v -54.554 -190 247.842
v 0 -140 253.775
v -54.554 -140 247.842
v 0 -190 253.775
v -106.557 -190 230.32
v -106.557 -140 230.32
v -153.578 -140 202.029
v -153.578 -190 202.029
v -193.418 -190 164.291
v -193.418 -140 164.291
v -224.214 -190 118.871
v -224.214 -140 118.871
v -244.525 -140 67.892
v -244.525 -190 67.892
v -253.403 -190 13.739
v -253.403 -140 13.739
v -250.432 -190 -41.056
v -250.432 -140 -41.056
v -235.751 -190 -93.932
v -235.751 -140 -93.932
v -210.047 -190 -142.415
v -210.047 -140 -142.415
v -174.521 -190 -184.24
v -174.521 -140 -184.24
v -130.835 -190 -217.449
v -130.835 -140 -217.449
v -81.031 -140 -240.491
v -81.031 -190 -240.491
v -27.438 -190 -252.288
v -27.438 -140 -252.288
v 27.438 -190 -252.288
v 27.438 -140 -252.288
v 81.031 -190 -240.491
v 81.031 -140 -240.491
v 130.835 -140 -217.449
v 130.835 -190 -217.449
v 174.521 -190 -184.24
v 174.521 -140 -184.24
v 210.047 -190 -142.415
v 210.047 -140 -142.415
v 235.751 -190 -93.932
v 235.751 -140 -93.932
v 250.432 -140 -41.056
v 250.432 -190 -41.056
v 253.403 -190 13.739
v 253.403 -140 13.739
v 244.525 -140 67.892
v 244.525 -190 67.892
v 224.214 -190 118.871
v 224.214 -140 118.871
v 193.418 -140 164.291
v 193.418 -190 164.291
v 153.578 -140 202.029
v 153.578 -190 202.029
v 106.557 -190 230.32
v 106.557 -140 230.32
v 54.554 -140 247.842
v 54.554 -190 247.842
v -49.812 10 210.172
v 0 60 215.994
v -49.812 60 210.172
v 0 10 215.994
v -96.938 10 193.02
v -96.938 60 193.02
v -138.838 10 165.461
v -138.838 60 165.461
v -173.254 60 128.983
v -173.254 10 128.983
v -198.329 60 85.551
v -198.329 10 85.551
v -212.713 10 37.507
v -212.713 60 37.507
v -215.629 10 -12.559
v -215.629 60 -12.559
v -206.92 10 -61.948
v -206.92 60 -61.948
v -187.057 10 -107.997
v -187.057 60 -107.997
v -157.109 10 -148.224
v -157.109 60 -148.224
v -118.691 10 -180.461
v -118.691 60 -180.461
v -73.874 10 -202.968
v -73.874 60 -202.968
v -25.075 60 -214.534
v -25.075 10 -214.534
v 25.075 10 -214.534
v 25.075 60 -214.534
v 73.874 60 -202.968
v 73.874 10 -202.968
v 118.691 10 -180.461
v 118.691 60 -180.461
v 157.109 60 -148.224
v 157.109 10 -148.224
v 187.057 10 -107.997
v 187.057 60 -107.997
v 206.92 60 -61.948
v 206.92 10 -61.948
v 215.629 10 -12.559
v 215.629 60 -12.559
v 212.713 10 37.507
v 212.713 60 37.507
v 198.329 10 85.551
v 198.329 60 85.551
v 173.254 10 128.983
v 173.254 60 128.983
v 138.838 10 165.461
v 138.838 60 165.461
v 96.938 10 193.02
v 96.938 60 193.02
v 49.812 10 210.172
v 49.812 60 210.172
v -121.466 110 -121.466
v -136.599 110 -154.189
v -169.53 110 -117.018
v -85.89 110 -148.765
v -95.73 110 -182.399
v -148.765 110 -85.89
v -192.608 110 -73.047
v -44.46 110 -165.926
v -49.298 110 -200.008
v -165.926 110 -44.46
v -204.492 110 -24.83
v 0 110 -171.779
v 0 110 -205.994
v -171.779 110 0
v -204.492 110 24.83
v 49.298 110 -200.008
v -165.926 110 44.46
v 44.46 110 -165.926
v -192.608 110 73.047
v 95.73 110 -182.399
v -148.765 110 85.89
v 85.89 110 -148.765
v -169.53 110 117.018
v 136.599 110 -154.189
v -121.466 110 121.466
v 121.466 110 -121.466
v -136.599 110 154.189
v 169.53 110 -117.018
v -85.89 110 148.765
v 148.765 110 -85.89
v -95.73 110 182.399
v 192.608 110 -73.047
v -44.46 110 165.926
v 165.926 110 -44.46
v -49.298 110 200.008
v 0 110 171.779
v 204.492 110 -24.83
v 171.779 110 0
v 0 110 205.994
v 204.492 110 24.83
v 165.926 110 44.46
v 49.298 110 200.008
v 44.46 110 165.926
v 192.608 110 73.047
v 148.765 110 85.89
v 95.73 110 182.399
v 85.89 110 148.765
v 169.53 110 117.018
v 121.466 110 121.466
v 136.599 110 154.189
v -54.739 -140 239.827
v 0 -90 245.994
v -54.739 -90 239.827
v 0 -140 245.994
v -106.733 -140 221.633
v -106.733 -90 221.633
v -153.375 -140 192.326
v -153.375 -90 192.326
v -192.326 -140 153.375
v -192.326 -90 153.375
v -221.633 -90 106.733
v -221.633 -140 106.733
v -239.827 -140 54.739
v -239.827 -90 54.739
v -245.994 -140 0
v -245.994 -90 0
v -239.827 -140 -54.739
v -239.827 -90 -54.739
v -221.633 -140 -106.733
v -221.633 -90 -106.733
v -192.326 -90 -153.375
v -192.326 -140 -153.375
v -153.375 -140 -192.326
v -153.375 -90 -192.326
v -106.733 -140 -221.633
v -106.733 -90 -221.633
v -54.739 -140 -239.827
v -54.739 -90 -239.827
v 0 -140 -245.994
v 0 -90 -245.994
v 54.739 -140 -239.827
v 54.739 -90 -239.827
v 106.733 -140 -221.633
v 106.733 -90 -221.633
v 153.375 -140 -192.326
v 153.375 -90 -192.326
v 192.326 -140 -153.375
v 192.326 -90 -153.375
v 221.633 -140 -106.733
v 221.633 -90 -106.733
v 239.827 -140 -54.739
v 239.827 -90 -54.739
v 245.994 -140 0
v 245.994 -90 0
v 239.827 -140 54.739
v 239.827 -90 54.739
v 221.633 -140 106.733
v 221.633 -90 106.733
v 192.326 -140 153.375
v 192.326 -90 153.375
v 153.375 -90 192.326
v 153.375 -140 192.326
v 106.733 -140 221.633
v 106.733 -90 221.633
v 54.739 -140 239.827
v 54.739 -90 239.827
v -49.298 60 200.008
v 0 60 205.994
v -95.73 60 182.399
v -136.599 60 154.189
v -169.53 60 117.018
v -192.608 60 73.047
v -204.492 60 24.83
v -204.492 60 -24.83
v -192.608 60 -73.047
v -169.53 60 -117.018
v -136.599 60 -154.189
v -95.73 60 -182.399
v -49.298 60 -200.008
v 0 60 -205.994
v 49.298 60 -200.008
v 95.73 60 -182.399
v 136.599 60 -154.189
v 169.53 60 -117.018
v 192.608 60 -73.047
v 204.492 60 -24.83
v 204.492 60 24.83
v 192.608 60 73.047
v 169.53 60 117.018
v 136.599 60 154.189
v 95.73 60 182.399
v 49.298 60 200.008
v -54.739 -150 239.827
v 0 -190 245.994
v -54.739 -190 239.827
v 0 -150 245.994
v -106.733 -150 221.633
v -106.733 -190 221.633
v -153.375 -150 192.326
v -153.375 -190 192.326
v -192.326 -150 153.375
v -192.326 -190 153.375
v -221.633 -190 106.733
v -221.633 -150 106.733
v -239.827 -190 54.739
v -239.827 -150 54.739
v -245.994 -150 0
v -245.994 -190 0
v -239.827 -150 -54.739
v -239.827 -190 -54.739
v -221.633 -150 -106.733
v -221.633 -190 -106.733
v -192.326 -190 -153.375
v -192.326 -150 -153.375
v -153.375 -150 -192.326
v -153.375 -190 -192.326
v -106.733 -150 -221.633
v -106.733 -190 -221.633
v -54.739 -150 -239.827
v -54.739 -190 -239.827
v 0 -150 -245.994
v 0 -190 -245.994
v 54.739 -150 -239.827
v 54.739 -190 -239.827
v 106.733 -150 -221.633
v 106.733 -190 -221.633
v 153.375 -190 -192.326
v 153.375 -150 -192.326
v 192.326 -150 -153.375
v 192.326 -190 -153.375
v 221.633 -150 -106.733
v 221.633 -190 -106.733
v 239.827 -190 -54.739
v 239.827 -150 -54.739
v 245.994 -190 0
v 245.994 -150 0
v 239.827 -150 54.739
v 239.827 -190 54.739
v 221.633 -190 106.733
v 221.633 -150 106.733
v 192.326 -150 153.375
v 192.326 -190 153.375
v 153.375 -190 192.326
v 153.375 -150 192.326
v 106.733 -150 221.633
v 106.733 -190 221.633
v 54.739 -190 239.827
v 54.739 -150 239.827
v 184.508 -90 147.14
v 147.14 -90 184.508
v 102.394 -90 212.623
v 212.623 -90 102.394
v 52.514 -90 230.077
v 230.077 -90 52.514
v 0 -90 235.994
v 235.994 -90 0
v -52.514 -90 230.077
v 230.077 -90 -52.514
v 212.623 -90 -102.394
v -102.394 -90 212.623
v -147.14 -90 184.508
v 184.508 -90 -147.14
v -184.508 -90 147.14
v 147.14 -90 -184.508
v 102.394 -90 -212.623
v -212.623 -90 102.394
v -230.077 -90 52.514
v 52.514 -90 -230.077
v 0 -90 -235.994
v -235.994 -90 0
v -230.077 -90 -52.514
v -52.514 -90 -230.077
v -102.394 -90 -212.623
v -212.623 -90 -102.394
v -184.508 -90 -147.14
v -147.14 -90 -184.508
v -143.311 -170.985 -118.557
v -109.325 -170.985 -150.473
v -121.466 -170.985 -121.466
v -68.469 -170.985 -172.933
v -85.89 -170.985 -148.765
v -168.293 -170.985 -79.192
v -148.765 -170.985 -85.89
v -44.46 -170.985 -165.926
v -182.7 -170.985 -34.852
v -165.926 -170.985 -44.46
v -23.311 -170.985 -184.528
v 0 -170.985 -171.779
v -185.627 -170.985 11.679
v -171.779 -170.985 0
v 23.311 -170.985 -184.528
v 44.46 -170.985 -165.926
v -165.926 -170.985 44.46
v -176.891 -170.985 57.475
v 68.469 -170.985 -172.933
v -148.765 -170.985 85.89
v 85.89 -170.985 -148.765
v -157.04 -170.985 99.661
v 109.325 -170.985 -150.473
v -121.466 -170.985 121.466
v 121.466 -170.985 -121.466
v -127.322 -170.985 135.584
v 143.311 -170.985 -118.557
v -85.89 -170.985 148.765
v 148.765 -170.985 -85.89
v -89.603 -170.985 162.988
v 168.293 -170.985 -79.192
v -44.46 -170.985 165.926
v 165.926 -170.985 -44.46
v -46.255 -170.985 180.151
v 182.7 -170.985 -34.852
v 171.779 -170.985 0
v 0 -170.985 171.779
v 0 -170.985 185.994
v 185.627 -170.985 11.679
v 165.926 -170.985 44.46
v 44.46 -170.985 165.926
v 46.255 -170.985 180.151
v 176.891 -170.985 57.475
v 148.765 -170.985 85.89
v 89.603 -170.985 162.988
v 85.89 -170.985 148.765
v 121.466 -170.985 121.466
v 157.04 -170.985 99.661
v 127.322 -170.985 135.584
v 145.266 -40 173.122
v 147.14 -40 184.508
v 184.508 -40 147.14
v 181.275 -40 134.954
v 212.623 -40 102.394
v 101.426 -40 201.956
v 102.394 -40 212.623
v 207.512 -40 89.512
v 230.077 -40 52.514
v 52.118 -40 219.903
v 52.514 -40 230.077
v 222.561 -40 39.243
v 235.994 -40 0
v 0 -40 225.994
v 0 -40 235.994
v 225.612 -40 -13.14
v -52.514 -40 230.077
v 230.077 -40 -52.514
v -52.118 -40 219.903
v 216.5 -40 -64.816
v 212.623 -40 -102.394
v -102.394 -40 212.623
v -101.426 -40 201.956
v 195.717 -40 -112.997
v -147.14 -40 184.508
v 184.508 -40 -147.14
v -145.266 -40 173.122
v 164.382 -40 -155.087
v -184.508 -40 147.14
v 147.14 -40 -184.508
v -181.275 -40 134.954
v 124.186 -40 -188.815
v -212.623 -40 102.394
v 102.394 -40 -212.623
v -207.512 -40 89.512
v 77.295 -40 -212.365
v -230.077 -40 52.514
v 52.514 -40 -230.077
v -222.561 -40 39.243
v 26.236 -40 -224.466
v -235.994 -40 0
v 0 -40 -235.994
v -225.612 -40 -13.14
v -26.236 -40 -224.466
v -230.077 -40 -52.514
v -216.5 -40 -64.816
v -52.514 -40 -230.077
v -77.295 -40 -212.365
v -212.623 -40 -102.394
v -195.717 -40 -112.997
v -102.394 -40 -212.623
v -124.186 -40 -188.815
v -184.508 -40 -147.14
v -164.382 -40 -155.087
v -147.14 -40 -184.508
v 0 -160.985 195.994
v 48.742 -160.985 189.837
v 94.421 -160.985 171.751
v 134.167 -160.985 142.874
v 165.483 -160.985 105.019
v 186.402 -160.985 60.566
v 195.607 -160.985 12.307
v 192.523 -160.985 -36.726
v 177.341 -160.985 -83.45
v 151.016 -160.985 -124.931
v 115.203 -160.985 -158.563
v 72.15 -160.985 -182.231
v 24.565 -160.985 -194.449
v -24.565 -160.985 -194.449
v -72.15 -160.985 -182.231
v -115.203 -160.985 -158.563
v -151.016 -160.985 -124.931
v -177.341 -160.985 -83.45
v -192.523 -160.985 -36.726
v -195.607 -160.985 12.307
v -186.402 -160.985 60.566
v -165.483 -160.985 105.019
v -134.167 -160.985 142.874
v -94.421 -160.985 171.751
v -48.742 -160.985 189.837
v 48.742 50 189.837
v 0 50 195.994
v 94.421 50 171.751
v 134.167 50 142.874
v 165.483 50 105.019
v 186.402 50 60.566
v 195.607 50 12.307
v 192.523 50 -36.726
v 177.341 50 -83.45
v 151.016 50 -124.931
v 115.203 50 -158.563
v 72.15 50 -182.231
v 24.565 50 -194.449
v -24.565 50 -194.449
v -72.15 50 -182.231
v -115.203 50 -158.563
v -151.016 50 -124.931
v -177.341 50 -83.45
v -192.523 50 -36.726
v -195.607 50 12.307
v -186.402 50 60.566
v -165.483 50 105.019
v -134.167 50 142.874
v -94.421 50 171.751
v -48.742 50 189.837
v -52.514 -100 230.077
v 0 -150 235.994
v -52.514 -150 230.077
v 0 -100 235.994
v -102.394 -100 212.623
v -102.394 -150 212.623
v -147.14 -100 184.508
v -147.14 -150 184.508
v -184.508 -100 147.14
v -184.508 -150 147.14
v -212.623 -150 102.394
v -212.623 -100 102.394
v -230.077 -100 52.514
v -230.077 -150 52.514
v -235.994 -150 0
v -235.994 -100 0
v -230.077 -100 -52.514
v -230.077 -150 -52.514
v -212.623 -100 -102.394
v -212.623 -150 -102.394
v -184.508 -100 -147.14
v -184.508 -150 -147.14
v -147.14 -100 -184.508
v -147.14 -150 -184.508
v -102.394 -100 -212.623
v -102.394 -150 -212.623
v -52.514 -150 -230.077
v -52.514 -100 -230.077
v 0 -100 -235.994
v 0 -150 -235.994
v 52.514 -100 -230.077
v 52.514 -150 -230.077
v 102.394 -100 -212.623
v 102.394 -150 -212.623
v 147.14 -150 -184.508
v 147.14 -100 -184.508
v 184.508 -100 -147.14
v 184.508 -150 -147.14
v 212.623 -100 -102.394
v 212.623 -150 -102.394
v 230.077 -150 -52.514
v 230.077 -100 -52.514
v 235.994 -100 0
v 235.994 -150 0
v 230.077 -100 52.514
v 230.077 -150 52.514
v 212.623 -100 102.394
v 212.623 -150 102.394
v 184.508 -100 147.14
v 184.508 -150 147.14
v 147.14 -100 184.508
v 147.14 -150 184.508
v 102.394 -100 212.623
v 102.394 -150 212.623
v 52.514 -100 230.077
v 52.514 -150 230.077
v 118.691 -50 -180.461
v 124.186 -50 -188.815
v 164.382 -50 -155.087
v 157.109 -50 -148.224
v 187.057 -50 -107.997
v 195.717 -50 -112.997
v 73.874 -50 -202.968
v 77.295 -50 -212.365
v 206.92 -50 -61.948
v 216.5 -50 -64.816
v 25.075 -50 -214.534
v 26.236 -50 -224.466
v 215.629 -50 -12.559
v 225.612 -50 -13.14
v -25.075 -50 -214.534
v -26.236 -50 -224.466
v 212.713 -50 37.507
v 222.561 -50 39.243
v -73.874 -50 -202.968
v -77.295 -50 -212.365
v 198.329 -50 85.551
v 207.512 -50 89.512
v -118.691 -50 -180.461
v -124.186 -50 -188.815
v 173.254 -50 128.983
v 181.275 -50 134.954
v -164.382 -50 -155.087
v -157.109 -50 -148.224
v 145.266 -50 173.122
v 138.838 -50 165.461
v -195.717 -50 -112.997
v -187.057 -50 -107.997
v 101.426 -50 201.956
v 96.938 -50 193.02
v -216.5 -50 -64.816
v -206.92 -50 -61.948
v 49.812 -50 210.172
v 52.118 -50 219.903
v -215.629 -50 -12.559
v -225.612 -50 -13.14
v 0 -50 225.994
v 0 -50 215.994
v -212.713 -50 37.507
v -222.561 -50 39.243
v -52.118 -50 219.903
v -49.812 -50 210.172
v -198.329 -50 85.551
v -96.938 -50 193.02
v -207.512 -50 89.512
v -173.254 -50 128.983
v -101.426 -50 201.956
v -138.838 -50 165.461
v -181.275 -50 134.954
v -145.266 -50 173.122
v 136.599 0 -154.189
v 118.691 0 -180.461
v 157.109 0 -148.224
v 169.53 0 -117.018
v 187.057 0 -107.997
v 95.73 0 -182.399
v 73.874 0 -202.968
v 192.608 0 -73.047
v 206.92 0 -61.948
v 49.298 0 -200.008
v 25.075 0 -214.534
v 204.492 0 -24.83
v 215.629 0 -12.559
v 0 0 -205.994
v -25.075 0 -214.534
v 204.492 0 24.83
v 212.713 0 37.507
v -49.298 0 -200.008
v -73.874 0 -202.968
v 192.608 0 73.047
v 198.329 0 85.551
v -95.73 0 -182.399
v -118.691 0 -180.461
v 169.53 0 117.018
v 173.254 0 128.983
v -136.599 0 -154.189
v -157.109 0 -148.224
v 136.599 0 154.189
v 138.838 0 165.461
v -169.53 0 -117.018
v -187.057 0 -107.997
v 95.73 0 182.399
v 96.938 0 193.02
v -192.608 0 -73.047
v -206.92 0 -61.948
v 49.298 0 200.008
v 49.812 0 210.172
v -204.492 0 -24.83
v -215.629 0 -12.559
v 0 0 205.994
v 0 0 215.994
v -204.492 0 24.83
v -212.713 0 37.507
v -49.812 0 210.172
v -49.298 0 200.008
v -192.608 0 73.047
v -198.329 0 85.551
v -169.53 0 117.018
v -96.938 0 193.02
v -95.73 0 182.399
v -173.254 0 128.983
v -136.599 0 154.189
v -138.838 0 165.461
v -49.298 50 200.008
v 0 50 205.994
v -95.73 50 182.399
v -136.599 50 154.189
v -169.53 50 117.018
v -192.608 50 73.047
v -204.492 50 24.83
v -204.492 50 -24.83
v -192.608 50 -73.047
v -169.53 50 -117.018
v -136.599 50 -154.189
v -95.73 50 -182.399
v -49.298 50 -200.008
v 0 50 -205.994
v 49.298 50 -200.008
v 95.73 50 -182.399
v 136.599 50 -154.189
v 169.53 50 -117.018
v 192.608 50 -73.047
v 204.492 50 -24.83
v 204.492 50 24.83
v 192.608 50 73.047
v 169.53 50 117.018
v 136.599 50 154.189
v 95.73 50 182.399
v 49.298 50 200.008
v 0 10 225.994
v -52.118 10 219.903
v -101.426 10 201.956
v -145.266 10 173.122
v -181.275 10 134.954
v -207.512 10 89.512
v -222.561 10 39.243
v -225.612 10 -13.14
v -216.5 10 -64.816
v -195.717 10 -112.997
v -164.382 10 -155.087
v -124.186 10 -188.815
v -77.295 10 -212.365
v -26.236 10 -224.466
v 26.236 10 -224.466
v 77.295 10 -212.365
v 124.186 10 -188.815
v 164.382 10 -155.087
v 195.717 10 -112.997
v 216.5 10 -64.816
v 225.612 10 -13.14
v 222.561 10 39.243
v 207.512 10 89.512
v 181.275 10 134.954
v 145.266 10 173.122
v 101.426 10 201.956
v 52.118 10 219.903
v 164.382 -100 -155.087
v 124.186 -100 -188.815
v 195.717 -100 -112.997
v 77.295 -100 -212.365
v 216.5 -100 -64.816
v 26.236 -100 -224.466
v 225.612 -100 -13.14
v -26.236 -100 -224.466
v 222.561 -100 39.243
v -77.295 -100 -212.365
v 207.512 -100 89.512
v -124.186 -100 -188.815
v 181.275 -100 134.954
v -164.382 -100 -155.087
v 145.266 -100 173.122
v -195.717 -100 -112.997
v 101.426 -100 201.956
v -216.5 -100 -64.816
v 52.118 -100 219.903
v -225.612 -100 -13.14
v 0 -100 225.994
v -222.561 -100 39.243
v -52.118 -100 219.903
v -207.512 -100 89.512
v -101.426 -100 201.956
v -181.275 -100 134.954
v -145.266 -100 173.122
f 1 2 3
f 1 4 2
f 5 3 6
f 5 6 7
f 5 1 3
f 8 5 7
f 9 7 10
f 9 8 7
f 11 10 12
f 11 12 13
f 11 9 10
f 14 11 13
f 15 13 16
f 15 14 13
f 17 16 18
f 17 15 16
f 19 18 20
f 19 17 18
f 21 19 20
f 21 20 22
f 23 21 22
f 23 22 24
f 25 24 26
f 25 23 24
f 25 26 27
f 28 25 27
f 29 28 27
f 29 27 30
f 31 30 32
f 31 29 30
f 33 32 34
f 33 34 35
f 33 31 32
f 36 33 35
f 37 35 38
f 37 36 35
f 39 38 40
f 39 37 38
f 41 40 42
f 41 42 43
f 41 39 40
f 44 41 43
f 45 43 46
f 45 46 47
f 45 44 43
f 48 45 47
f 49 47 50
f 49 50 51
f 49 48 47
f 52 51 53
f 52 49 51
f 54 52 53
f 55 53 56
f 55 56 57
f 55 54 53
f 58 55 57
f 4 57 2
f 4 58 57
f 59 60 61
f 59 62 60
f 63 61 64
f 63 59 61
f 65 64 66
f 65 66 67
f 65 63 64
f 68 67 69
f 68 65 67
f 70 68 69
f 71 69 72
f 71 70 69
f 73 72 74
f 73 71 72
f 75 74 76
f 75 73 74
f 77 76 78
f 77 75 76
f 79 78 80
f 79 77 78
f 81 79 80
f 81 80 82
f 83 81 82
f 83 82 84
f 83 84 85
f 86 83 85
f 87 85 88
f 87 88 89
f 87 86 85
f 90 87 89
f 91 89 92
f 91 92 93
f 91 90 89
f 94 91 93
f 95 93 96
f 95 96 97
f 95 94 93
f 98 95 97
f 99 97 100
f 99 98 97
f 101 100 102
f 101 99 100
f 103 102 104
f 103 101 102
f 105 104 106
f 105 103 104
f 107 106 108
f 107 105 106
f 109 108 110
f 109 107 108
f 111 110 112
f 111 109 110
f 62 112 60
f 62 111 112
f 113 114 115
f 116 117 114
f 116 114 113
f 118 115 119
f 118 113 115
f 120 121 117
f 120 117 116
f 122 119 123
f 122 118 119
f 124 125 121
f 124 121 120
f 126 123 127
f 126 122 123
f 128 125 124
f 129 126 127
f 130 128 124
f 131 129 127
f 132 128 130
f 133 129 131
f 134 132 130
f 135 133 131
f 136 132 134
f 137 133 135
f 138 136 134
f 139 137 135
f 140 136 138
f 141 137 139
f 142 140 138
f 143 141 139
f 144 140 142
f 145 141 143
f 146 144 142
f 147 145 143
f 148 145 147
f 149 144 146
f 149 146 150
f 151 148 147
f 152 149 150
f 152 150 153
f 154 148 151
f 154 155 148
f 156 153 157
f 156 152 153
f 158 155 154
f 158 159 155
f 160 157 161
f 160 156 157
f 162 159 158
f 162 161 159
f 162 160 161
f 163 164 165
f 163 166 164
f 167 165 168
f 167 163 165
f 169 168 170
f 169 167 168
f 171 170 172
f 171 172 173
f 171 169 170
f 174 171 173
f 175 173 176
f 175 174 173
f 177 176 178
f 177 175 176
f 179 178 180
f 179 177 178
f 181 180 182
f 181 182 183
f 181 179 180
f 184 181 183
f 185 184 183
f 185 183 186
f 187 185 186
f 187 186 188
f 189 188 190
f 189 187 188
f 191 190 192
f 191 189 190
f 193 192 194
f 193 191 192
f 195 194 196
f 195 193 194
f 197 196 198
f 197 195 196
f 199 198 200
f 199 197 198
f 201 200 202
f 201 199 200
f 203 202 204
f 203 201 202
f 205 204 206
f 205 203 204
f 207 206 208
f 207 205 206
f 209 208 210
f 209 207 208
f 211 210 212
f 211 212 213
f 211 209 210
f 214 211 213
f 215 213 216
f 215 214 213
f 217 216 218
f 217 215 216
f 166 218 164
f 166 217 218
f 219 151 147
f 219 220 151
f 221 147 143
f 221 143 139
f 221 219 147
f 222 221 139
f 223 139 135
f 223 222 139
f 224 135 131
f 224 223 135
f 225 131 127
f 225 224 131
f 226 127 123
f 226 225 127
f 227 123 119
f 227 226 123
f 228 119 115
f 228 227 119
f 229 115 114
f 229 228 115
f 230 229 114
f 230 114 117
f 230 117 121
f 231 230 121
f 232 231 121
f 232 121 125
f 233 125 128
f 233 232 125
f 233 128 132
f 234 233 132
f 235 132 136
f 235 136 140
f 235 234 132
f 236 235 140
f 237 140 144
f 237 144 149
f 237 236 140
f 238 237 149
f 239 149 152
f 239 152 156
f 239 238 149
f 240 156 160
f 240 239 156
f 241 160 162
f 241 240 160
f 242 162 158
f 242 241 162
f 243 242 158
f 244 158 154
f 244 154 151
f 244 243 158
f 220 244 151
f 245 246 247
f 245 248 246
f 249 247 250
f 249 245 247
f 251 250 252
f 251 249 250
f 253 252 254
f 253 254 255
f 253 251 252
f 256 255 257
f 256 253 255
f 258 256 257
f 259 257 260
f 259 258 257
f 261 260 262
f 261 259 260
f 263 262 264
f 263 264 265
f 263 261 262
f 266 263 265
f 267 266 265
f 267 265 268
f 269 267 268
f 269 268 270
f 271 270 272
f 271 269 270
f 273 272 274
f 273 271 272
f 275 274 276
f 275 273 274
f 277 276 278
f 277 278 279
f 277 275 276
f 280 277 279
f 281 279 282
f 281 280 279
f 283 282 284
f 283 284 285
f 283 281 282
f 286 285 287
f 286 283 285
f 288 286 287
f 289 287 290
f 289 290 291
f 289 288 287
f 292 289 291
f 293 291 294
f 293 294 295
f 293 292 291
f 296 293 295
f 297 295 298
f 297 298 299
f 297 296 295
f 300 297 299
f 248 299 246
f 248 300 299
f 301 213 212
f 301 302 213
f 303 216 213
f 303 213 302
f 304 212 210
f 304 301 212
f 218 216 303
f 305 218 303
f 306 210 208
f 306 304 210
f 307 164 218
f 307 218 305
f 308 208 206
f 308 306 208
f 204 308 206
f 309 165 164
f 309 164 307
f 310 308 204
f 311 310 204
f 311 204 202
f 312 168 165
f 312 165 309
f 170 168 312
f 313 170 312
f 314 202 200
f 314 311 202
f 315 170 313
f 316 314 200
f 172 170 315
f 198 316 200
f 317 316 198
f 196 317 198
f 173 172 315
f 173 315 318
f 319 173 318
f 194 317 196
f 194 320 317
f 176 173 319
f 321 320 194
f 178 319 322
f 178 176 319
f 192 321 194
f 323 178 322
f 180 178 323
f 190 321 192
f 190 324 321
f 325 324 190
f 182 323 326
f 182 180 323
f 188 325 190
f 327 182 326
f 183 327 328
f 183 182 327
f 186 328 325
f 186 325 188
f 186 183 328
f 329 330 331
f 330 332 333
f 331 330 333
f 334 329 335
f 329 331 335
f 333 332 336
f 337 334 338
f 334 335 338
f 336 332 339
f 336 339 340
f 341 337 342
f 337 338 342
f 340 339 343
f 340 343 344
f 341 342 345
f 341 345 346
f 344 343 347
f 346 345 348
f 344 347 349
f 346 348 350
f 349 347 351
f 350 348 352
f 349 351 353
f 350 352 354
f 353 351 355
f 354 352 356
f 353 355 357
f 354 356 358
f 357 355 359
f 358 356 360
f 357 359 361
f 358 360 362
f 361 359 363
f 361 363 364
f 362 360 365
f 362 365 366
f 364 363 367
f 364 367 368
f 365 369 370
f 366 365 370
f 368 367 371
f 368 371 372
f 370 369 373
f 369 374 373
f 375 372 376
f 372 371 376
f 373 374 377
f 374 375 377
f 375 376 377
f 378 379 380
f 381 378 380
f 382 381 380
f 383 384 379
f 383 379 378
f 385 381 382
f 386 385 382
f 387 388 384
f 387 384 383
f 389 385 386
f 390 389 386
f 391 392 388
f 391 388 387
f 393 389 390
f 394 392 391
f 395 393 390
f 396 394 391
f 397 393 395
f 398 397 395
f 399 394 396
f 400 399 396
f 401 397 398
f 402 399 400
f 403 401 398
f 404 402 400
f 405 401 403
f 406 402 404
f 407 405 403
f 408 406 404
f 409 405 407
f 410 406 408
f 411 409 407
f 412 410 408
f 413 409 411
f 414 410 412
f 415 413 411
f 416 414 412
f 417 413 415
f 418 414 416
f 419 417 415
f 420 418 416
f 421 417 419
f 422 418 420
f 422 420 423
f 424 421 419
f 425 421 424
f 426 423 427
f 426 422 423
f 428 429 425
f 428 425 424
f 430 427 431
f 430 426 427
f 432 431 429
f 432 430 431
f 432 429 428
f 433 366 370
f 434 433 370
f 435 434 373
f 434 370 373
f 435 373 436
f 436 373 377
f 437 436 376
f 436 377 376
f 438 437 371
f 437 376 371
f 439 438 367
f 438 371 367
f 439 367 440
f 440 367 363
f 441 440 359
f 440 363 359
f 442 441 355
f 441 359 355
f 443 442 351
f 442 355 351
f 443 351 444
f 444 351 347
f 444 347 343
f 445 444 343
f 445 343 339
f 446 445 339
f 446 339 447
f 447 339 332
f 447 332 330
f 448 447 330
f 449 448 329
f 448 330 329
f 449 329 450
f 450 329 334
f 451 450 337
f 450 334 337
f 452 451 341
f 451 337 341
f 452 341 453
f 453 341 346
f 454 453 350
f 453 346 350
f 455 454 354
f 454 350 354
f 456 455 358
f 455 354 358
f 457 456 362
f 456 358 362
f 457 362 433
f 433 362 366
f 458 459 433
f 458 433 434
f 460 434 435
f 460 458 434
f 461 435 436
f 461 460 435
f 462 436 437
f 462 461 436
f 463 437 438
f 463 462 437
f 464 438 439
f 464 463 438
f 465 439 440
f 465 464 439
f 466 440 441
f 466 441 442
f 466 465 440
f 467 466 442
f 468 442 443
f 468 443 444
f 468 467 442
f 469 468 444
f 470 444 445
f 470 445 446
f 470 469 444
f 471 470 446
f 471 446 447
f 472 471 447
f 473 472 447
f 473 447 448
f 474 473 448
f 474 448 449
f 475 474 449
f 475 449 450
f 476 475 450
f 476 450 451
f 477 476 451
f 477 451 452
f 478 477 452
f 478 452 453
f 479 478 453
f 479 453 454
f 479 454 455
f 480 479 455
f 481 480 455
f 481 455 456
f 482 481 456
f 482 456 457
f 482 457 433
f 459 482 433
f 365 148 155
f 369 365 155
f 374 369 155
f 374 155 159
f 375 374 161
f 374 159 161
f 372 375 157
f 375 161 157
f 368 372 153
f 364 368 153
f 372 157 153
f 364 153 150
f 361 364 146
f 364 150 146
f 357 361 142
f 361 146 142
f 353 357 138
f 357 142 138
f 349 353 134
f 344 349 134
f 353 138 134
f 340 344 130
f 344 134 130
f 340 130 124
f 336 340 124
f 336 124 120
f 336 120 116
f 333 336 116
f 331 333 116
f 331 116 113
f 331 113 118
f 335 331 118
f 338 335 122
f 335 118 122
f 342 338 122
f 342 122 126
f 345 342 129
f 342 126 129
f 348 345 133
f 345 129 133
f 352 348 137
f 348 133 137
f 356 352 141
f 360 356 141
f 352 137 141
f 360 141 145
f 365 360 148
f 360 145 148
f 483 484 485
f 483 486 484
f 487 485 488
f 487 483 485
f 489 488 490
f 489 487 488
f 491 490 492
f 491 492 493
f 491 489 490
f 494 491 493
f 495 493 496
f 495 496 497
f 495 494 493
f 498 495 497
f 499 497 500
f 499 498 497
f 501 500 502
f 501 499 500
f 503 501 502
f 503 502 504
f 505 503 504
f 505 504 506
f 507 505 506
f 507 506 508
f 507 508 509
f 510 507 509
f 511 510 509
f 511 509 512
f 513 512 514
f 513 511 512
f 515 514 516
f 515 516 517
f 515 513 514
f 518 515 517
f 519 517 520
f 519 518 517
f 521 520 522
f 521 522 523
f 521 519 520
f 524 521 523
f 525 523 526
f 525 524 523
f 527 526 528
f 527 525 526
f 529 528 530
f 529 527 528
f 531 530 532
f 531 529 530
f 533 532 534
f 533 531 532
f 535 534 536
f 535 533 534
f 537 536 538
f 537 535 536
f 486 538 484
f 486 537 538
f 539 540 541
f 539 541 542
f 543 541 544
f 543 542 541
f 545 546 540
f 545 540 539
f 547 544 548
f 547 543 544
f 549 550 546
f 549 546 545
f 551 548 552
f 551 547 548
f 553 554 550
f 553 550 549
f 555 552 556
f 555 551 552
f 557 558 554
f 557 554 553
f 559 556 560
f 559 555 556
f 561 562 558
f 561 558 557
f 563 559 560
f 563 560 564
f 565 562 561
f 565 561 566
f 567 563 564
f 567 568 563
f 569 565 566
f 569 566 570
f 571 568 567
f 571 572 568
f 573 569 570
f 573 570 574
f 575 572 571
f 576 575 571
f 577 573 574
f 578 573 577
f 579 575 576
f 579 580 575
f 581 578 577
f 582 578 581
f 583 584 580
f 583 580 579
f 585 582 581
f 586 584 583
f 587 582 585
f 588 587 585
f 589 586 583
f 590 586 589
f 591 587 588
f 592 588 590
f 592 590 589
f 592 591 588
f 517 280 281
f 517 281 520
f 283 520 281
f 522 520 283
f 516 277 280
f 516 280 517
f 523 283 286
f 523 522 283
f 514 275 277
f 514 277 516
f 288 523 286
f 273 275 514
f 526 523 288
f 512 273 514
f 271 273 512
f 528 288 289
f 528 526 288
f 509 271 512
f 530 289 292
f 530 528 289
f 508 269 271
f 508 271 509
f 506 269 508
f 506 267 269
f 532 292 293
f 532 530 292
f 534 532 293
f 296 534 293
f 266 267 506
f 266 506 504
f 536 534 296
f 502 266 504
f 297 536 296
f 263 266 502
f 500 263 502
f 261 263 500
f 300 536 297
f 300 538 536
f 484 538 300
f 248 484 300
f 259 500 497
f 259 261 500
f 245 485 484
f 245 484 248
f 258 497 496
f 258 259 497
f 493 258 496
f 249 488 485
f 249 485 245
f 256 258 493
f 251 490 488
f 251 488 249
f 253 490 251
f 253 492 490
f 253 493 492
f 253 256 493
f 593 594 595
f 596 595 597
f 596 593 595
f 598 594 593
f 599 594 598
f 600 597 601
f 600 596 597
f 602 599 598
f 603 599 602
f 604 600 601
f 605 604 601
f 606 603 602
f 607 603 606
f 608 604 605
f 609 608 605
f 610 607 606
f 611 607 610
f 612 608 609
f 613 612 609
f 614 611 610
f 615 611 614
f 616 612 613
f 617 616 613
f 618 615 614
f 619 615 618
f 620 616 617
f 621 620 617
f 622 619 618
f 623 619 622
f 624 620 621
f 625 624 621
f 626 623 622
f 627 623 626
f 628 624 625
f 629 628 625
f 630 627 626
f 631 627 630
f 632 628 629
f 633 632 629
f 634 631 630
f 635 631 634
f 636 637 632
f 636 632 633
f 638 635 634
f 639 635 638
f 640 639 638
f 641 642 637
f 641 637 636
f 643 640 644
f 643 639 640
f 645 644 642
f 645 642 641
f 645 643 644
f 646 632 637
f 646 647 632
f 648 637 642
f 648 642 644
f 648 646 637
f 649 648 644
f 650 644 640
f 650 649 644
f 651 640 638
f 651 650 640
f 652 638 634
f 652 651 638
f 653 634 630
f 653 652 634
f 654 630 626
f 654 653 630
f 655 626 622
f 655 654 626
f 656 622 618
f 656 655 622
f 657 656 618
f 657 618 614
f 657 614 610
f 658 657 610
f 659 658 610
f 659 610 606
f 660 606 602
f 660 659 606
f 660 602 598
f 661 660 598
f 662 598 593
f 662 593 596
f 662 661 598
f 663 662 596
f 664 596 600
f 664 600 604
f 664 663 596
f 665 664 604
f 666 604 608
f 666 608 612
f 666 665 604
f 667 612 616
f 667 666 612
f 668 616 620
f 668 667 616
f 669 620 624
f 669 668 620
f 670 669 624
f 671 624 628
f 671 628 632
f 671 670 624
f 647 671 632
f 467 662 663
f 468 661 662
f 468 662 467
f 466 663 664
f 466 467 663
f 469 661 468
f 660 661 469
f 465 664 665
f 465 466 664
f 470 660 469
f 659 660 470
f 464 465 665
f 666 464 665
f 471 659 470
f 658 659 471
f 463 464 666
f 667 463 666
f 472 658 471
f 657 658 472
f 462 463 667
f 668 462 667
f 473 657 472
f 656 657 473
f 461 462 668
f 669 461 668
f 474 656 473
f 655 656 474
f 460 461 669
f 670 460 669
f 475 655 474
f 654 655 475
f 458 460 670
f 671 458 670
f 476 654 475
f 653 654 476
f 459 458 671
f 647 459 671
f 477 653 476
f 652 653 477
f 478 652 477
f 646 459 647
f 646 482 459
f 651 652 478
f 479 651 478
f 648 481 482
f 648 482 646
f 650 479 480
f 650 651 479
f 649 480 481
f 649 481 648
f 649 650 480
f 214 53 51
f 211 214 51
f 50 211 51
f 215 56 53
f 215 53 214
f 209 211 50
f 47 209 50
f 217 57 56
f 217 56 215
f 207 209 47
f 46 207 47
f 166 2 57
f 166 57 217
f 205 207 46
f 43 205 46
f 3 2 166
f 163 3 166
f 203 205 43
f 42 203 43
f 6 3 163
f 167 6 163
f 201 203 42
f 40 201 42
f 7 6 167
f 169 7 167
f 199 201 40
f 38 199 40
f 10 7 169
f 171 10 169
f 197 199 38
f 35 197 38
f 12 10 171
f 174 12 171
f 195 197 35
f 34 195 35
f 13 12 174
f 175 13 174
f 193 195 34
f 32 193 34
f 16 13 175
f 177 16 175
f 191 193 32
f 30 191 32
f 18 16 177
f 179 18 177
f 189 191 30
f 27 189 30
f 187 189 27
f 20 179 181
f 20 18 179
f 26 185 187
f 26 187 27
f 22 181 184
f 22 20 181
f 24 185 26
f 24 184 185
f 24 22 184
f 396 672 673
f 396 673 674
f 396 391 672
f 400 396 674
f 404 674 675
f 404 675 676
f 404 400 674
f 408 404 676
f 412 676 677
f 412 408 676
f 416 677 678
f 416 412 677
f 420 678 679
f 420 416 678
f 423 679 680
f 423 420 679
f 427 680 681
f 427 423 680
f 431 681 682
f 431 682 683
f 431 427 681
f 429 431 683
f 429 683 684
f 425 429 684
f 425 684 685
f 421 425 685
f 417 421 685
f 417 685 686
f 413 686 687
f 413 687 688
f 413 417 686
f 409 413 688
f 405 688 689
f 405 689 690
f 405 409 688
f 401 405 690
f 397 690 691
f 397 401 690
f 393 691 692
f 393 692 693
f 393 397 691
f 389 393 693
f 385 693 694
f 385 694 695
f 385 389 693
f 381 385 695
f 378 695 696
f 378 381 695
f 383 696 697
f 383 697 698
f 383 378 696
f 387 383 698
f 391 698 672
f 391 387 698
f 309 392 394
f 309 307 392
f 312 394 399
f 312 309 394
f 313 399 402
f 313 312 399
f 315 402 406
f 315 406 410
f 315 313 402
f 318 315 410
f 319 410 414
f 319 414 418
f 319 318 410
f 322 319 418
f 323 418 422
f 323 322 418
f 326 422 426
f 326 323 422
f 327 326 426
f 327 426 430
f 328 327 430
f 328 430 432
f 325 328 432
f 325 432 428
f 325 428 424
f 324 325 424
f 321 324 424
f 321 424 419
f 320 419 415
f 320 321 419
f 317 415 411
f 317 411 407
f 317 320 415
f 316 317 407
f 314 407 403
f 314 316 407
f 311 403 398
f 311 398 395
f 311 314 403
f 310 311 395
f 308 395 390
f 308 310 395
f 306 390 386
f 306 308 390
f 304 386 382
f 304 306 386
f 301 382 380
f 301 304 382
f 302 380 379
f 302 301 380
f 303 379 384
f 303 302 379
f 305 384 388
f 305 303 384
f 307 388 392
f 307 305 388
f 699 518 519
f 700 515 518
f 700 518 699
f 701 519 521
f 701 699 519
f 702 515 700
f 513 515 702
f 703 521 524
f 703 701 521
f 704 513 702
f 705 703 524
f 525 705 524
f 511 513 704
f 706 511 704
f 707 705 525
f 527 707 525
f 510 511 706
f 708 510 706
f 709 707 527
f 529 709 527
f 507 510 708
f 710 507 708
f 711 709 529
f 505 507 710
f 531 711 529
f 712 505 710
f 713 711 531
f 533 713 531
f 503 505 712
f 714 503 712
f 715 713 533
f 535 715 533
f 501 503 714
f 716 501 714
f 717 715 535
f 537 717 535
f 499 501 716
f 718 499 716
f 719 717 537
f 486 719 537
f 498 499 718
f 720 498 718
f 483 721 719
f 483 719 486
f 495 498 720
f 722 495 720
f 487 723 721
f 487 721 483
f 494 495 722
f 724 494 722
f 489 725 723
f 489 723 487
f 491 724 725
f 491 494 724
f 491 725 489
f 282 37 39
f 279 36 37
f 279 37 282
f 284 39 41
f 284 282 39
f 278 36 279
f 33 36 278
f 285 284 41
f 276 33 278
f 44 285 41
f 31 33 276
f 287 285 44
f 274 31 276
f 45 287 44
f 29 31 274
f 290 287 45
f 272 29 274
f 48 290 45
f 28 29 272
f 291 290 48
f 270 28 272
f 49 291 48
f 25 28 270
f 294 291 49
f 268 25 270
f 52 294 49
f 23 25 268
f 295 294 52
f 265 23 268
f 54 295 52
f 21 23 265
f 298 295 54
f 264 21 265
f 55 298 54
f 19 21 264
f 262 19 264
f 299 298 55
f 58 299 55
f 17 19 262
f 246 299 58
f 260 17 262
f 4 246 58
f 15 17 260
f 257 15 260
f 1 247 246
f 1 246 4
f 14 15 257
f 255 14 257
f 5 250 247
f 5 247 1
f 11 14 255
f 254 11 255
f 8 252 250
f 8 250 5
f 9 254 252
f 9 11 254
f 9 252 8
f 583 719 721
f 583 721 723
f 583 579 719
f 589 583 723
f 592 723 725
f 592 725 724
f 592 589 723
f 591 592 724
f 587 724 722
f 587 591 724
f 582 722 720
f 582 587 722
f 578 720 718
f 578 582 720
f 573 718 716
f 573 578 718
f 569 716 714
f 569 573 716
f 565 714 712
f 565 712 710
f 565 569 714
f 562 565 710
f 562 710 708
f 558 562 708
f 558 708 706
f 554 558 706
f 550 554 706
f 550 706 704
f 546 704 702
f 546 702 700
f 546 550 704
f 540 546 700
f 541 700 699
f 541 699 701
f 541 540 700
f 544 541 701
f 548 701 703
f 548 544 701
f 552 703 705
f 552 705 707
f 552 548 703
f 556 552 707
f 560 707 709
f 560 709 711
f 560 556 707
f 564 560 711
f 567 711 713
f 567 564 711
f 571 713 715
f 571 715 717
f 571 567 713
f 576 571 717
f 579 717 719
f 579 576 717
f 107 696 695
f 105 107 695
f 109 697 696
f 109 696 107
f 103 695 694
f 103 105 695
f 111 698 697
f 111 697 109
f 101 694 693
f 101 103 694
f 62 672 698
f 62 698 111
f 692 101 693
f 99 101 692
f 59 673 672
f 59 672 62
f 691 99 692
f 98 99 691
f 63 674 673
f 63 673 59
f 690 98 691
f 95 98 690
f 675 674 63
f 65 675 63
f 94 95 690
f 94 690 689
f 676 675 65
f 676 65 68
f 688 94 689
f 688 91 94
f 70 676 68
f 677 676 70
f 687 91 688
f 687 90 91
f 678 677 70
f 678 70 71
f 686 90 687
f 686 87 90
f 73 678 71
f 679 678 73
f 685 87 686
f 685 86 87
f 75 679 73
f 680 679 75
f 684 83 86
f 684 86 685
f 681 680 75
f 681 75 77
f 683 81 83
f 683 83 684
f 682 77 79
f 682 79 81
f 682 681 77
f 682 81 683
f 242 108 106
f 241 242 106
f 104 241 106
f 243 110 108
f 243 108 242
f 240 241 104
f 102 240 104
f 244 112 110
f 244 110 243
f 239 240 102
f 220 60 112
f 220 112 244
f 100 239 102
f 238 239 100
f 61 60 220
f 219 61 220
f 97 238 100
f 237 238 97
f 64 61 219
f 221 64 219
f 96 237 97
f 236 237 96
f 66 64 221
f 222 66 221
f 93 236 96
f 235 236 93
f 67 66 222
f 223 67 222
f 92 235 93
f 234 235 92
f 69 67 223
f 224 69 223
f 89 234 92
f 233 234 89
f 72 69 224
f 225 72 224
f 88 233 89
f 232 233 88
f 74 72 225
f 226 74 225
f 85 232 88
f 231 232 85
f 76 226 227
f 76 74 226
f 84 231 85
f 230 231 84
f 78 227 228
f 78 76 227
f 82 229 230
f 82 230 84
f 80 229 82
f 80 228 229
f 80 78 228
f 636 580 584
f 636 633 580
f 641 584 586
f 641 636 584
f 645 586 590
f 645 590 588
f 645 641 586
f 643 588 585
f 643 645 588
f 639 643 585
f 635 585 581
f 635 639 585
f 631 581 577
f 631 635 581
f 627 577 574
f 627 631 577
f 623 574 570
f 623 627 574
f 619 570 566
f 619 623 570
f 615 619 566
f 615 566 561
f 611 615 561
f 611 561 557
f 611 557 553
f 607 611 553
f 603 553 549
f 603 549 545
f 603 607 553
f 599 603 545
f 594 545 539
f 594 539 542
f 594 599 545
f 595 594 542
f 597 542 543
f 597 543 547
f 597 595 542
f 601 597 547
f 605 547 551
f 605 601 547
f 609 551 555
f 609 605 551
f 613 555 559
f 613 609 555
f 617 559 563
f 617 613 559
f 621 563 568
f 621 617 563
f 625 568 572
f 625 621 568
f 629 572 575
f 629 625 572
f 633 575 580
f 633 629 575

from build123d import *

# Parameters (mm, degrees)
SKETCH9_R           = 195.99424204
SKETCH9_R_2         = 171.779053358
BOSS_EXTRUDE1_DEPTH = 280.985470498
CHAMFER1_SIZE       = 10


with BuildPart() as part:
    # Sketch4 → Revolve3 (revolve)
    with BuildSketch(Plane.XY, mode=Mode.PRIVATE) as revolve3_sk:
        Polygon((-253.775337615, -190), (-245.99424204, -190), (-245.99424204, -150), (-235.99424204, -150), (-235.99424204, -100), (-225.99424204, -100), (-225.99424204, -50), (-215.99424204, -50), (-215.99424204, 0), (-205.99424204, 0), (-205.99424204, 50), (-195.99424204, 50), (-195.99424204, 110), (-205.99424204, 110), (-205.99424204, 60), (-215.99424204, 60), (-215.99424204, 10), (-225.99424204, 10), (-225.99424204, -40), (-235.99424204, -40), (-235.99424204, -90), (-245.99424204, -90), (-245.99424204, -140), (-253.775337615, -140), align=None)
    revolve(revolve3_sk.sketch.rotate(Axis((0, 105.494376543, 0), (0, -1, 0)), 270), axis=Axis((0, 105.494376543, 0), (0, -1, 0)))

    # Sketch9 → Boss-Extrude1 (add)
    with BuildSketch(Plane(origin=(0, 110, 0), x_dir=(1, 0, 0), z_dir=(0, 1, 0))):
        with Locations(Location((0, 0, 0), (0, 0, 270))):
            Circle(SKETCH9_R)
        with Locations(Location((0, 0, 0), (0, 0, 270))):
            Circle(SKETCH9_R_2, mode=Mode.SUBTRACT)
    extrude(amount=-BOSS_EXTRUDE1_DEPTH)

    # Chamfer1
    chamfer1_edges = [part.edges().sort_by_distance(p)[0] for p in [
        (0, -170.985470498, -195.99424204),
    ]]
    chamfer(chamfer1_edges, length=CHAMFER1_SIZE)


solid = part.part
